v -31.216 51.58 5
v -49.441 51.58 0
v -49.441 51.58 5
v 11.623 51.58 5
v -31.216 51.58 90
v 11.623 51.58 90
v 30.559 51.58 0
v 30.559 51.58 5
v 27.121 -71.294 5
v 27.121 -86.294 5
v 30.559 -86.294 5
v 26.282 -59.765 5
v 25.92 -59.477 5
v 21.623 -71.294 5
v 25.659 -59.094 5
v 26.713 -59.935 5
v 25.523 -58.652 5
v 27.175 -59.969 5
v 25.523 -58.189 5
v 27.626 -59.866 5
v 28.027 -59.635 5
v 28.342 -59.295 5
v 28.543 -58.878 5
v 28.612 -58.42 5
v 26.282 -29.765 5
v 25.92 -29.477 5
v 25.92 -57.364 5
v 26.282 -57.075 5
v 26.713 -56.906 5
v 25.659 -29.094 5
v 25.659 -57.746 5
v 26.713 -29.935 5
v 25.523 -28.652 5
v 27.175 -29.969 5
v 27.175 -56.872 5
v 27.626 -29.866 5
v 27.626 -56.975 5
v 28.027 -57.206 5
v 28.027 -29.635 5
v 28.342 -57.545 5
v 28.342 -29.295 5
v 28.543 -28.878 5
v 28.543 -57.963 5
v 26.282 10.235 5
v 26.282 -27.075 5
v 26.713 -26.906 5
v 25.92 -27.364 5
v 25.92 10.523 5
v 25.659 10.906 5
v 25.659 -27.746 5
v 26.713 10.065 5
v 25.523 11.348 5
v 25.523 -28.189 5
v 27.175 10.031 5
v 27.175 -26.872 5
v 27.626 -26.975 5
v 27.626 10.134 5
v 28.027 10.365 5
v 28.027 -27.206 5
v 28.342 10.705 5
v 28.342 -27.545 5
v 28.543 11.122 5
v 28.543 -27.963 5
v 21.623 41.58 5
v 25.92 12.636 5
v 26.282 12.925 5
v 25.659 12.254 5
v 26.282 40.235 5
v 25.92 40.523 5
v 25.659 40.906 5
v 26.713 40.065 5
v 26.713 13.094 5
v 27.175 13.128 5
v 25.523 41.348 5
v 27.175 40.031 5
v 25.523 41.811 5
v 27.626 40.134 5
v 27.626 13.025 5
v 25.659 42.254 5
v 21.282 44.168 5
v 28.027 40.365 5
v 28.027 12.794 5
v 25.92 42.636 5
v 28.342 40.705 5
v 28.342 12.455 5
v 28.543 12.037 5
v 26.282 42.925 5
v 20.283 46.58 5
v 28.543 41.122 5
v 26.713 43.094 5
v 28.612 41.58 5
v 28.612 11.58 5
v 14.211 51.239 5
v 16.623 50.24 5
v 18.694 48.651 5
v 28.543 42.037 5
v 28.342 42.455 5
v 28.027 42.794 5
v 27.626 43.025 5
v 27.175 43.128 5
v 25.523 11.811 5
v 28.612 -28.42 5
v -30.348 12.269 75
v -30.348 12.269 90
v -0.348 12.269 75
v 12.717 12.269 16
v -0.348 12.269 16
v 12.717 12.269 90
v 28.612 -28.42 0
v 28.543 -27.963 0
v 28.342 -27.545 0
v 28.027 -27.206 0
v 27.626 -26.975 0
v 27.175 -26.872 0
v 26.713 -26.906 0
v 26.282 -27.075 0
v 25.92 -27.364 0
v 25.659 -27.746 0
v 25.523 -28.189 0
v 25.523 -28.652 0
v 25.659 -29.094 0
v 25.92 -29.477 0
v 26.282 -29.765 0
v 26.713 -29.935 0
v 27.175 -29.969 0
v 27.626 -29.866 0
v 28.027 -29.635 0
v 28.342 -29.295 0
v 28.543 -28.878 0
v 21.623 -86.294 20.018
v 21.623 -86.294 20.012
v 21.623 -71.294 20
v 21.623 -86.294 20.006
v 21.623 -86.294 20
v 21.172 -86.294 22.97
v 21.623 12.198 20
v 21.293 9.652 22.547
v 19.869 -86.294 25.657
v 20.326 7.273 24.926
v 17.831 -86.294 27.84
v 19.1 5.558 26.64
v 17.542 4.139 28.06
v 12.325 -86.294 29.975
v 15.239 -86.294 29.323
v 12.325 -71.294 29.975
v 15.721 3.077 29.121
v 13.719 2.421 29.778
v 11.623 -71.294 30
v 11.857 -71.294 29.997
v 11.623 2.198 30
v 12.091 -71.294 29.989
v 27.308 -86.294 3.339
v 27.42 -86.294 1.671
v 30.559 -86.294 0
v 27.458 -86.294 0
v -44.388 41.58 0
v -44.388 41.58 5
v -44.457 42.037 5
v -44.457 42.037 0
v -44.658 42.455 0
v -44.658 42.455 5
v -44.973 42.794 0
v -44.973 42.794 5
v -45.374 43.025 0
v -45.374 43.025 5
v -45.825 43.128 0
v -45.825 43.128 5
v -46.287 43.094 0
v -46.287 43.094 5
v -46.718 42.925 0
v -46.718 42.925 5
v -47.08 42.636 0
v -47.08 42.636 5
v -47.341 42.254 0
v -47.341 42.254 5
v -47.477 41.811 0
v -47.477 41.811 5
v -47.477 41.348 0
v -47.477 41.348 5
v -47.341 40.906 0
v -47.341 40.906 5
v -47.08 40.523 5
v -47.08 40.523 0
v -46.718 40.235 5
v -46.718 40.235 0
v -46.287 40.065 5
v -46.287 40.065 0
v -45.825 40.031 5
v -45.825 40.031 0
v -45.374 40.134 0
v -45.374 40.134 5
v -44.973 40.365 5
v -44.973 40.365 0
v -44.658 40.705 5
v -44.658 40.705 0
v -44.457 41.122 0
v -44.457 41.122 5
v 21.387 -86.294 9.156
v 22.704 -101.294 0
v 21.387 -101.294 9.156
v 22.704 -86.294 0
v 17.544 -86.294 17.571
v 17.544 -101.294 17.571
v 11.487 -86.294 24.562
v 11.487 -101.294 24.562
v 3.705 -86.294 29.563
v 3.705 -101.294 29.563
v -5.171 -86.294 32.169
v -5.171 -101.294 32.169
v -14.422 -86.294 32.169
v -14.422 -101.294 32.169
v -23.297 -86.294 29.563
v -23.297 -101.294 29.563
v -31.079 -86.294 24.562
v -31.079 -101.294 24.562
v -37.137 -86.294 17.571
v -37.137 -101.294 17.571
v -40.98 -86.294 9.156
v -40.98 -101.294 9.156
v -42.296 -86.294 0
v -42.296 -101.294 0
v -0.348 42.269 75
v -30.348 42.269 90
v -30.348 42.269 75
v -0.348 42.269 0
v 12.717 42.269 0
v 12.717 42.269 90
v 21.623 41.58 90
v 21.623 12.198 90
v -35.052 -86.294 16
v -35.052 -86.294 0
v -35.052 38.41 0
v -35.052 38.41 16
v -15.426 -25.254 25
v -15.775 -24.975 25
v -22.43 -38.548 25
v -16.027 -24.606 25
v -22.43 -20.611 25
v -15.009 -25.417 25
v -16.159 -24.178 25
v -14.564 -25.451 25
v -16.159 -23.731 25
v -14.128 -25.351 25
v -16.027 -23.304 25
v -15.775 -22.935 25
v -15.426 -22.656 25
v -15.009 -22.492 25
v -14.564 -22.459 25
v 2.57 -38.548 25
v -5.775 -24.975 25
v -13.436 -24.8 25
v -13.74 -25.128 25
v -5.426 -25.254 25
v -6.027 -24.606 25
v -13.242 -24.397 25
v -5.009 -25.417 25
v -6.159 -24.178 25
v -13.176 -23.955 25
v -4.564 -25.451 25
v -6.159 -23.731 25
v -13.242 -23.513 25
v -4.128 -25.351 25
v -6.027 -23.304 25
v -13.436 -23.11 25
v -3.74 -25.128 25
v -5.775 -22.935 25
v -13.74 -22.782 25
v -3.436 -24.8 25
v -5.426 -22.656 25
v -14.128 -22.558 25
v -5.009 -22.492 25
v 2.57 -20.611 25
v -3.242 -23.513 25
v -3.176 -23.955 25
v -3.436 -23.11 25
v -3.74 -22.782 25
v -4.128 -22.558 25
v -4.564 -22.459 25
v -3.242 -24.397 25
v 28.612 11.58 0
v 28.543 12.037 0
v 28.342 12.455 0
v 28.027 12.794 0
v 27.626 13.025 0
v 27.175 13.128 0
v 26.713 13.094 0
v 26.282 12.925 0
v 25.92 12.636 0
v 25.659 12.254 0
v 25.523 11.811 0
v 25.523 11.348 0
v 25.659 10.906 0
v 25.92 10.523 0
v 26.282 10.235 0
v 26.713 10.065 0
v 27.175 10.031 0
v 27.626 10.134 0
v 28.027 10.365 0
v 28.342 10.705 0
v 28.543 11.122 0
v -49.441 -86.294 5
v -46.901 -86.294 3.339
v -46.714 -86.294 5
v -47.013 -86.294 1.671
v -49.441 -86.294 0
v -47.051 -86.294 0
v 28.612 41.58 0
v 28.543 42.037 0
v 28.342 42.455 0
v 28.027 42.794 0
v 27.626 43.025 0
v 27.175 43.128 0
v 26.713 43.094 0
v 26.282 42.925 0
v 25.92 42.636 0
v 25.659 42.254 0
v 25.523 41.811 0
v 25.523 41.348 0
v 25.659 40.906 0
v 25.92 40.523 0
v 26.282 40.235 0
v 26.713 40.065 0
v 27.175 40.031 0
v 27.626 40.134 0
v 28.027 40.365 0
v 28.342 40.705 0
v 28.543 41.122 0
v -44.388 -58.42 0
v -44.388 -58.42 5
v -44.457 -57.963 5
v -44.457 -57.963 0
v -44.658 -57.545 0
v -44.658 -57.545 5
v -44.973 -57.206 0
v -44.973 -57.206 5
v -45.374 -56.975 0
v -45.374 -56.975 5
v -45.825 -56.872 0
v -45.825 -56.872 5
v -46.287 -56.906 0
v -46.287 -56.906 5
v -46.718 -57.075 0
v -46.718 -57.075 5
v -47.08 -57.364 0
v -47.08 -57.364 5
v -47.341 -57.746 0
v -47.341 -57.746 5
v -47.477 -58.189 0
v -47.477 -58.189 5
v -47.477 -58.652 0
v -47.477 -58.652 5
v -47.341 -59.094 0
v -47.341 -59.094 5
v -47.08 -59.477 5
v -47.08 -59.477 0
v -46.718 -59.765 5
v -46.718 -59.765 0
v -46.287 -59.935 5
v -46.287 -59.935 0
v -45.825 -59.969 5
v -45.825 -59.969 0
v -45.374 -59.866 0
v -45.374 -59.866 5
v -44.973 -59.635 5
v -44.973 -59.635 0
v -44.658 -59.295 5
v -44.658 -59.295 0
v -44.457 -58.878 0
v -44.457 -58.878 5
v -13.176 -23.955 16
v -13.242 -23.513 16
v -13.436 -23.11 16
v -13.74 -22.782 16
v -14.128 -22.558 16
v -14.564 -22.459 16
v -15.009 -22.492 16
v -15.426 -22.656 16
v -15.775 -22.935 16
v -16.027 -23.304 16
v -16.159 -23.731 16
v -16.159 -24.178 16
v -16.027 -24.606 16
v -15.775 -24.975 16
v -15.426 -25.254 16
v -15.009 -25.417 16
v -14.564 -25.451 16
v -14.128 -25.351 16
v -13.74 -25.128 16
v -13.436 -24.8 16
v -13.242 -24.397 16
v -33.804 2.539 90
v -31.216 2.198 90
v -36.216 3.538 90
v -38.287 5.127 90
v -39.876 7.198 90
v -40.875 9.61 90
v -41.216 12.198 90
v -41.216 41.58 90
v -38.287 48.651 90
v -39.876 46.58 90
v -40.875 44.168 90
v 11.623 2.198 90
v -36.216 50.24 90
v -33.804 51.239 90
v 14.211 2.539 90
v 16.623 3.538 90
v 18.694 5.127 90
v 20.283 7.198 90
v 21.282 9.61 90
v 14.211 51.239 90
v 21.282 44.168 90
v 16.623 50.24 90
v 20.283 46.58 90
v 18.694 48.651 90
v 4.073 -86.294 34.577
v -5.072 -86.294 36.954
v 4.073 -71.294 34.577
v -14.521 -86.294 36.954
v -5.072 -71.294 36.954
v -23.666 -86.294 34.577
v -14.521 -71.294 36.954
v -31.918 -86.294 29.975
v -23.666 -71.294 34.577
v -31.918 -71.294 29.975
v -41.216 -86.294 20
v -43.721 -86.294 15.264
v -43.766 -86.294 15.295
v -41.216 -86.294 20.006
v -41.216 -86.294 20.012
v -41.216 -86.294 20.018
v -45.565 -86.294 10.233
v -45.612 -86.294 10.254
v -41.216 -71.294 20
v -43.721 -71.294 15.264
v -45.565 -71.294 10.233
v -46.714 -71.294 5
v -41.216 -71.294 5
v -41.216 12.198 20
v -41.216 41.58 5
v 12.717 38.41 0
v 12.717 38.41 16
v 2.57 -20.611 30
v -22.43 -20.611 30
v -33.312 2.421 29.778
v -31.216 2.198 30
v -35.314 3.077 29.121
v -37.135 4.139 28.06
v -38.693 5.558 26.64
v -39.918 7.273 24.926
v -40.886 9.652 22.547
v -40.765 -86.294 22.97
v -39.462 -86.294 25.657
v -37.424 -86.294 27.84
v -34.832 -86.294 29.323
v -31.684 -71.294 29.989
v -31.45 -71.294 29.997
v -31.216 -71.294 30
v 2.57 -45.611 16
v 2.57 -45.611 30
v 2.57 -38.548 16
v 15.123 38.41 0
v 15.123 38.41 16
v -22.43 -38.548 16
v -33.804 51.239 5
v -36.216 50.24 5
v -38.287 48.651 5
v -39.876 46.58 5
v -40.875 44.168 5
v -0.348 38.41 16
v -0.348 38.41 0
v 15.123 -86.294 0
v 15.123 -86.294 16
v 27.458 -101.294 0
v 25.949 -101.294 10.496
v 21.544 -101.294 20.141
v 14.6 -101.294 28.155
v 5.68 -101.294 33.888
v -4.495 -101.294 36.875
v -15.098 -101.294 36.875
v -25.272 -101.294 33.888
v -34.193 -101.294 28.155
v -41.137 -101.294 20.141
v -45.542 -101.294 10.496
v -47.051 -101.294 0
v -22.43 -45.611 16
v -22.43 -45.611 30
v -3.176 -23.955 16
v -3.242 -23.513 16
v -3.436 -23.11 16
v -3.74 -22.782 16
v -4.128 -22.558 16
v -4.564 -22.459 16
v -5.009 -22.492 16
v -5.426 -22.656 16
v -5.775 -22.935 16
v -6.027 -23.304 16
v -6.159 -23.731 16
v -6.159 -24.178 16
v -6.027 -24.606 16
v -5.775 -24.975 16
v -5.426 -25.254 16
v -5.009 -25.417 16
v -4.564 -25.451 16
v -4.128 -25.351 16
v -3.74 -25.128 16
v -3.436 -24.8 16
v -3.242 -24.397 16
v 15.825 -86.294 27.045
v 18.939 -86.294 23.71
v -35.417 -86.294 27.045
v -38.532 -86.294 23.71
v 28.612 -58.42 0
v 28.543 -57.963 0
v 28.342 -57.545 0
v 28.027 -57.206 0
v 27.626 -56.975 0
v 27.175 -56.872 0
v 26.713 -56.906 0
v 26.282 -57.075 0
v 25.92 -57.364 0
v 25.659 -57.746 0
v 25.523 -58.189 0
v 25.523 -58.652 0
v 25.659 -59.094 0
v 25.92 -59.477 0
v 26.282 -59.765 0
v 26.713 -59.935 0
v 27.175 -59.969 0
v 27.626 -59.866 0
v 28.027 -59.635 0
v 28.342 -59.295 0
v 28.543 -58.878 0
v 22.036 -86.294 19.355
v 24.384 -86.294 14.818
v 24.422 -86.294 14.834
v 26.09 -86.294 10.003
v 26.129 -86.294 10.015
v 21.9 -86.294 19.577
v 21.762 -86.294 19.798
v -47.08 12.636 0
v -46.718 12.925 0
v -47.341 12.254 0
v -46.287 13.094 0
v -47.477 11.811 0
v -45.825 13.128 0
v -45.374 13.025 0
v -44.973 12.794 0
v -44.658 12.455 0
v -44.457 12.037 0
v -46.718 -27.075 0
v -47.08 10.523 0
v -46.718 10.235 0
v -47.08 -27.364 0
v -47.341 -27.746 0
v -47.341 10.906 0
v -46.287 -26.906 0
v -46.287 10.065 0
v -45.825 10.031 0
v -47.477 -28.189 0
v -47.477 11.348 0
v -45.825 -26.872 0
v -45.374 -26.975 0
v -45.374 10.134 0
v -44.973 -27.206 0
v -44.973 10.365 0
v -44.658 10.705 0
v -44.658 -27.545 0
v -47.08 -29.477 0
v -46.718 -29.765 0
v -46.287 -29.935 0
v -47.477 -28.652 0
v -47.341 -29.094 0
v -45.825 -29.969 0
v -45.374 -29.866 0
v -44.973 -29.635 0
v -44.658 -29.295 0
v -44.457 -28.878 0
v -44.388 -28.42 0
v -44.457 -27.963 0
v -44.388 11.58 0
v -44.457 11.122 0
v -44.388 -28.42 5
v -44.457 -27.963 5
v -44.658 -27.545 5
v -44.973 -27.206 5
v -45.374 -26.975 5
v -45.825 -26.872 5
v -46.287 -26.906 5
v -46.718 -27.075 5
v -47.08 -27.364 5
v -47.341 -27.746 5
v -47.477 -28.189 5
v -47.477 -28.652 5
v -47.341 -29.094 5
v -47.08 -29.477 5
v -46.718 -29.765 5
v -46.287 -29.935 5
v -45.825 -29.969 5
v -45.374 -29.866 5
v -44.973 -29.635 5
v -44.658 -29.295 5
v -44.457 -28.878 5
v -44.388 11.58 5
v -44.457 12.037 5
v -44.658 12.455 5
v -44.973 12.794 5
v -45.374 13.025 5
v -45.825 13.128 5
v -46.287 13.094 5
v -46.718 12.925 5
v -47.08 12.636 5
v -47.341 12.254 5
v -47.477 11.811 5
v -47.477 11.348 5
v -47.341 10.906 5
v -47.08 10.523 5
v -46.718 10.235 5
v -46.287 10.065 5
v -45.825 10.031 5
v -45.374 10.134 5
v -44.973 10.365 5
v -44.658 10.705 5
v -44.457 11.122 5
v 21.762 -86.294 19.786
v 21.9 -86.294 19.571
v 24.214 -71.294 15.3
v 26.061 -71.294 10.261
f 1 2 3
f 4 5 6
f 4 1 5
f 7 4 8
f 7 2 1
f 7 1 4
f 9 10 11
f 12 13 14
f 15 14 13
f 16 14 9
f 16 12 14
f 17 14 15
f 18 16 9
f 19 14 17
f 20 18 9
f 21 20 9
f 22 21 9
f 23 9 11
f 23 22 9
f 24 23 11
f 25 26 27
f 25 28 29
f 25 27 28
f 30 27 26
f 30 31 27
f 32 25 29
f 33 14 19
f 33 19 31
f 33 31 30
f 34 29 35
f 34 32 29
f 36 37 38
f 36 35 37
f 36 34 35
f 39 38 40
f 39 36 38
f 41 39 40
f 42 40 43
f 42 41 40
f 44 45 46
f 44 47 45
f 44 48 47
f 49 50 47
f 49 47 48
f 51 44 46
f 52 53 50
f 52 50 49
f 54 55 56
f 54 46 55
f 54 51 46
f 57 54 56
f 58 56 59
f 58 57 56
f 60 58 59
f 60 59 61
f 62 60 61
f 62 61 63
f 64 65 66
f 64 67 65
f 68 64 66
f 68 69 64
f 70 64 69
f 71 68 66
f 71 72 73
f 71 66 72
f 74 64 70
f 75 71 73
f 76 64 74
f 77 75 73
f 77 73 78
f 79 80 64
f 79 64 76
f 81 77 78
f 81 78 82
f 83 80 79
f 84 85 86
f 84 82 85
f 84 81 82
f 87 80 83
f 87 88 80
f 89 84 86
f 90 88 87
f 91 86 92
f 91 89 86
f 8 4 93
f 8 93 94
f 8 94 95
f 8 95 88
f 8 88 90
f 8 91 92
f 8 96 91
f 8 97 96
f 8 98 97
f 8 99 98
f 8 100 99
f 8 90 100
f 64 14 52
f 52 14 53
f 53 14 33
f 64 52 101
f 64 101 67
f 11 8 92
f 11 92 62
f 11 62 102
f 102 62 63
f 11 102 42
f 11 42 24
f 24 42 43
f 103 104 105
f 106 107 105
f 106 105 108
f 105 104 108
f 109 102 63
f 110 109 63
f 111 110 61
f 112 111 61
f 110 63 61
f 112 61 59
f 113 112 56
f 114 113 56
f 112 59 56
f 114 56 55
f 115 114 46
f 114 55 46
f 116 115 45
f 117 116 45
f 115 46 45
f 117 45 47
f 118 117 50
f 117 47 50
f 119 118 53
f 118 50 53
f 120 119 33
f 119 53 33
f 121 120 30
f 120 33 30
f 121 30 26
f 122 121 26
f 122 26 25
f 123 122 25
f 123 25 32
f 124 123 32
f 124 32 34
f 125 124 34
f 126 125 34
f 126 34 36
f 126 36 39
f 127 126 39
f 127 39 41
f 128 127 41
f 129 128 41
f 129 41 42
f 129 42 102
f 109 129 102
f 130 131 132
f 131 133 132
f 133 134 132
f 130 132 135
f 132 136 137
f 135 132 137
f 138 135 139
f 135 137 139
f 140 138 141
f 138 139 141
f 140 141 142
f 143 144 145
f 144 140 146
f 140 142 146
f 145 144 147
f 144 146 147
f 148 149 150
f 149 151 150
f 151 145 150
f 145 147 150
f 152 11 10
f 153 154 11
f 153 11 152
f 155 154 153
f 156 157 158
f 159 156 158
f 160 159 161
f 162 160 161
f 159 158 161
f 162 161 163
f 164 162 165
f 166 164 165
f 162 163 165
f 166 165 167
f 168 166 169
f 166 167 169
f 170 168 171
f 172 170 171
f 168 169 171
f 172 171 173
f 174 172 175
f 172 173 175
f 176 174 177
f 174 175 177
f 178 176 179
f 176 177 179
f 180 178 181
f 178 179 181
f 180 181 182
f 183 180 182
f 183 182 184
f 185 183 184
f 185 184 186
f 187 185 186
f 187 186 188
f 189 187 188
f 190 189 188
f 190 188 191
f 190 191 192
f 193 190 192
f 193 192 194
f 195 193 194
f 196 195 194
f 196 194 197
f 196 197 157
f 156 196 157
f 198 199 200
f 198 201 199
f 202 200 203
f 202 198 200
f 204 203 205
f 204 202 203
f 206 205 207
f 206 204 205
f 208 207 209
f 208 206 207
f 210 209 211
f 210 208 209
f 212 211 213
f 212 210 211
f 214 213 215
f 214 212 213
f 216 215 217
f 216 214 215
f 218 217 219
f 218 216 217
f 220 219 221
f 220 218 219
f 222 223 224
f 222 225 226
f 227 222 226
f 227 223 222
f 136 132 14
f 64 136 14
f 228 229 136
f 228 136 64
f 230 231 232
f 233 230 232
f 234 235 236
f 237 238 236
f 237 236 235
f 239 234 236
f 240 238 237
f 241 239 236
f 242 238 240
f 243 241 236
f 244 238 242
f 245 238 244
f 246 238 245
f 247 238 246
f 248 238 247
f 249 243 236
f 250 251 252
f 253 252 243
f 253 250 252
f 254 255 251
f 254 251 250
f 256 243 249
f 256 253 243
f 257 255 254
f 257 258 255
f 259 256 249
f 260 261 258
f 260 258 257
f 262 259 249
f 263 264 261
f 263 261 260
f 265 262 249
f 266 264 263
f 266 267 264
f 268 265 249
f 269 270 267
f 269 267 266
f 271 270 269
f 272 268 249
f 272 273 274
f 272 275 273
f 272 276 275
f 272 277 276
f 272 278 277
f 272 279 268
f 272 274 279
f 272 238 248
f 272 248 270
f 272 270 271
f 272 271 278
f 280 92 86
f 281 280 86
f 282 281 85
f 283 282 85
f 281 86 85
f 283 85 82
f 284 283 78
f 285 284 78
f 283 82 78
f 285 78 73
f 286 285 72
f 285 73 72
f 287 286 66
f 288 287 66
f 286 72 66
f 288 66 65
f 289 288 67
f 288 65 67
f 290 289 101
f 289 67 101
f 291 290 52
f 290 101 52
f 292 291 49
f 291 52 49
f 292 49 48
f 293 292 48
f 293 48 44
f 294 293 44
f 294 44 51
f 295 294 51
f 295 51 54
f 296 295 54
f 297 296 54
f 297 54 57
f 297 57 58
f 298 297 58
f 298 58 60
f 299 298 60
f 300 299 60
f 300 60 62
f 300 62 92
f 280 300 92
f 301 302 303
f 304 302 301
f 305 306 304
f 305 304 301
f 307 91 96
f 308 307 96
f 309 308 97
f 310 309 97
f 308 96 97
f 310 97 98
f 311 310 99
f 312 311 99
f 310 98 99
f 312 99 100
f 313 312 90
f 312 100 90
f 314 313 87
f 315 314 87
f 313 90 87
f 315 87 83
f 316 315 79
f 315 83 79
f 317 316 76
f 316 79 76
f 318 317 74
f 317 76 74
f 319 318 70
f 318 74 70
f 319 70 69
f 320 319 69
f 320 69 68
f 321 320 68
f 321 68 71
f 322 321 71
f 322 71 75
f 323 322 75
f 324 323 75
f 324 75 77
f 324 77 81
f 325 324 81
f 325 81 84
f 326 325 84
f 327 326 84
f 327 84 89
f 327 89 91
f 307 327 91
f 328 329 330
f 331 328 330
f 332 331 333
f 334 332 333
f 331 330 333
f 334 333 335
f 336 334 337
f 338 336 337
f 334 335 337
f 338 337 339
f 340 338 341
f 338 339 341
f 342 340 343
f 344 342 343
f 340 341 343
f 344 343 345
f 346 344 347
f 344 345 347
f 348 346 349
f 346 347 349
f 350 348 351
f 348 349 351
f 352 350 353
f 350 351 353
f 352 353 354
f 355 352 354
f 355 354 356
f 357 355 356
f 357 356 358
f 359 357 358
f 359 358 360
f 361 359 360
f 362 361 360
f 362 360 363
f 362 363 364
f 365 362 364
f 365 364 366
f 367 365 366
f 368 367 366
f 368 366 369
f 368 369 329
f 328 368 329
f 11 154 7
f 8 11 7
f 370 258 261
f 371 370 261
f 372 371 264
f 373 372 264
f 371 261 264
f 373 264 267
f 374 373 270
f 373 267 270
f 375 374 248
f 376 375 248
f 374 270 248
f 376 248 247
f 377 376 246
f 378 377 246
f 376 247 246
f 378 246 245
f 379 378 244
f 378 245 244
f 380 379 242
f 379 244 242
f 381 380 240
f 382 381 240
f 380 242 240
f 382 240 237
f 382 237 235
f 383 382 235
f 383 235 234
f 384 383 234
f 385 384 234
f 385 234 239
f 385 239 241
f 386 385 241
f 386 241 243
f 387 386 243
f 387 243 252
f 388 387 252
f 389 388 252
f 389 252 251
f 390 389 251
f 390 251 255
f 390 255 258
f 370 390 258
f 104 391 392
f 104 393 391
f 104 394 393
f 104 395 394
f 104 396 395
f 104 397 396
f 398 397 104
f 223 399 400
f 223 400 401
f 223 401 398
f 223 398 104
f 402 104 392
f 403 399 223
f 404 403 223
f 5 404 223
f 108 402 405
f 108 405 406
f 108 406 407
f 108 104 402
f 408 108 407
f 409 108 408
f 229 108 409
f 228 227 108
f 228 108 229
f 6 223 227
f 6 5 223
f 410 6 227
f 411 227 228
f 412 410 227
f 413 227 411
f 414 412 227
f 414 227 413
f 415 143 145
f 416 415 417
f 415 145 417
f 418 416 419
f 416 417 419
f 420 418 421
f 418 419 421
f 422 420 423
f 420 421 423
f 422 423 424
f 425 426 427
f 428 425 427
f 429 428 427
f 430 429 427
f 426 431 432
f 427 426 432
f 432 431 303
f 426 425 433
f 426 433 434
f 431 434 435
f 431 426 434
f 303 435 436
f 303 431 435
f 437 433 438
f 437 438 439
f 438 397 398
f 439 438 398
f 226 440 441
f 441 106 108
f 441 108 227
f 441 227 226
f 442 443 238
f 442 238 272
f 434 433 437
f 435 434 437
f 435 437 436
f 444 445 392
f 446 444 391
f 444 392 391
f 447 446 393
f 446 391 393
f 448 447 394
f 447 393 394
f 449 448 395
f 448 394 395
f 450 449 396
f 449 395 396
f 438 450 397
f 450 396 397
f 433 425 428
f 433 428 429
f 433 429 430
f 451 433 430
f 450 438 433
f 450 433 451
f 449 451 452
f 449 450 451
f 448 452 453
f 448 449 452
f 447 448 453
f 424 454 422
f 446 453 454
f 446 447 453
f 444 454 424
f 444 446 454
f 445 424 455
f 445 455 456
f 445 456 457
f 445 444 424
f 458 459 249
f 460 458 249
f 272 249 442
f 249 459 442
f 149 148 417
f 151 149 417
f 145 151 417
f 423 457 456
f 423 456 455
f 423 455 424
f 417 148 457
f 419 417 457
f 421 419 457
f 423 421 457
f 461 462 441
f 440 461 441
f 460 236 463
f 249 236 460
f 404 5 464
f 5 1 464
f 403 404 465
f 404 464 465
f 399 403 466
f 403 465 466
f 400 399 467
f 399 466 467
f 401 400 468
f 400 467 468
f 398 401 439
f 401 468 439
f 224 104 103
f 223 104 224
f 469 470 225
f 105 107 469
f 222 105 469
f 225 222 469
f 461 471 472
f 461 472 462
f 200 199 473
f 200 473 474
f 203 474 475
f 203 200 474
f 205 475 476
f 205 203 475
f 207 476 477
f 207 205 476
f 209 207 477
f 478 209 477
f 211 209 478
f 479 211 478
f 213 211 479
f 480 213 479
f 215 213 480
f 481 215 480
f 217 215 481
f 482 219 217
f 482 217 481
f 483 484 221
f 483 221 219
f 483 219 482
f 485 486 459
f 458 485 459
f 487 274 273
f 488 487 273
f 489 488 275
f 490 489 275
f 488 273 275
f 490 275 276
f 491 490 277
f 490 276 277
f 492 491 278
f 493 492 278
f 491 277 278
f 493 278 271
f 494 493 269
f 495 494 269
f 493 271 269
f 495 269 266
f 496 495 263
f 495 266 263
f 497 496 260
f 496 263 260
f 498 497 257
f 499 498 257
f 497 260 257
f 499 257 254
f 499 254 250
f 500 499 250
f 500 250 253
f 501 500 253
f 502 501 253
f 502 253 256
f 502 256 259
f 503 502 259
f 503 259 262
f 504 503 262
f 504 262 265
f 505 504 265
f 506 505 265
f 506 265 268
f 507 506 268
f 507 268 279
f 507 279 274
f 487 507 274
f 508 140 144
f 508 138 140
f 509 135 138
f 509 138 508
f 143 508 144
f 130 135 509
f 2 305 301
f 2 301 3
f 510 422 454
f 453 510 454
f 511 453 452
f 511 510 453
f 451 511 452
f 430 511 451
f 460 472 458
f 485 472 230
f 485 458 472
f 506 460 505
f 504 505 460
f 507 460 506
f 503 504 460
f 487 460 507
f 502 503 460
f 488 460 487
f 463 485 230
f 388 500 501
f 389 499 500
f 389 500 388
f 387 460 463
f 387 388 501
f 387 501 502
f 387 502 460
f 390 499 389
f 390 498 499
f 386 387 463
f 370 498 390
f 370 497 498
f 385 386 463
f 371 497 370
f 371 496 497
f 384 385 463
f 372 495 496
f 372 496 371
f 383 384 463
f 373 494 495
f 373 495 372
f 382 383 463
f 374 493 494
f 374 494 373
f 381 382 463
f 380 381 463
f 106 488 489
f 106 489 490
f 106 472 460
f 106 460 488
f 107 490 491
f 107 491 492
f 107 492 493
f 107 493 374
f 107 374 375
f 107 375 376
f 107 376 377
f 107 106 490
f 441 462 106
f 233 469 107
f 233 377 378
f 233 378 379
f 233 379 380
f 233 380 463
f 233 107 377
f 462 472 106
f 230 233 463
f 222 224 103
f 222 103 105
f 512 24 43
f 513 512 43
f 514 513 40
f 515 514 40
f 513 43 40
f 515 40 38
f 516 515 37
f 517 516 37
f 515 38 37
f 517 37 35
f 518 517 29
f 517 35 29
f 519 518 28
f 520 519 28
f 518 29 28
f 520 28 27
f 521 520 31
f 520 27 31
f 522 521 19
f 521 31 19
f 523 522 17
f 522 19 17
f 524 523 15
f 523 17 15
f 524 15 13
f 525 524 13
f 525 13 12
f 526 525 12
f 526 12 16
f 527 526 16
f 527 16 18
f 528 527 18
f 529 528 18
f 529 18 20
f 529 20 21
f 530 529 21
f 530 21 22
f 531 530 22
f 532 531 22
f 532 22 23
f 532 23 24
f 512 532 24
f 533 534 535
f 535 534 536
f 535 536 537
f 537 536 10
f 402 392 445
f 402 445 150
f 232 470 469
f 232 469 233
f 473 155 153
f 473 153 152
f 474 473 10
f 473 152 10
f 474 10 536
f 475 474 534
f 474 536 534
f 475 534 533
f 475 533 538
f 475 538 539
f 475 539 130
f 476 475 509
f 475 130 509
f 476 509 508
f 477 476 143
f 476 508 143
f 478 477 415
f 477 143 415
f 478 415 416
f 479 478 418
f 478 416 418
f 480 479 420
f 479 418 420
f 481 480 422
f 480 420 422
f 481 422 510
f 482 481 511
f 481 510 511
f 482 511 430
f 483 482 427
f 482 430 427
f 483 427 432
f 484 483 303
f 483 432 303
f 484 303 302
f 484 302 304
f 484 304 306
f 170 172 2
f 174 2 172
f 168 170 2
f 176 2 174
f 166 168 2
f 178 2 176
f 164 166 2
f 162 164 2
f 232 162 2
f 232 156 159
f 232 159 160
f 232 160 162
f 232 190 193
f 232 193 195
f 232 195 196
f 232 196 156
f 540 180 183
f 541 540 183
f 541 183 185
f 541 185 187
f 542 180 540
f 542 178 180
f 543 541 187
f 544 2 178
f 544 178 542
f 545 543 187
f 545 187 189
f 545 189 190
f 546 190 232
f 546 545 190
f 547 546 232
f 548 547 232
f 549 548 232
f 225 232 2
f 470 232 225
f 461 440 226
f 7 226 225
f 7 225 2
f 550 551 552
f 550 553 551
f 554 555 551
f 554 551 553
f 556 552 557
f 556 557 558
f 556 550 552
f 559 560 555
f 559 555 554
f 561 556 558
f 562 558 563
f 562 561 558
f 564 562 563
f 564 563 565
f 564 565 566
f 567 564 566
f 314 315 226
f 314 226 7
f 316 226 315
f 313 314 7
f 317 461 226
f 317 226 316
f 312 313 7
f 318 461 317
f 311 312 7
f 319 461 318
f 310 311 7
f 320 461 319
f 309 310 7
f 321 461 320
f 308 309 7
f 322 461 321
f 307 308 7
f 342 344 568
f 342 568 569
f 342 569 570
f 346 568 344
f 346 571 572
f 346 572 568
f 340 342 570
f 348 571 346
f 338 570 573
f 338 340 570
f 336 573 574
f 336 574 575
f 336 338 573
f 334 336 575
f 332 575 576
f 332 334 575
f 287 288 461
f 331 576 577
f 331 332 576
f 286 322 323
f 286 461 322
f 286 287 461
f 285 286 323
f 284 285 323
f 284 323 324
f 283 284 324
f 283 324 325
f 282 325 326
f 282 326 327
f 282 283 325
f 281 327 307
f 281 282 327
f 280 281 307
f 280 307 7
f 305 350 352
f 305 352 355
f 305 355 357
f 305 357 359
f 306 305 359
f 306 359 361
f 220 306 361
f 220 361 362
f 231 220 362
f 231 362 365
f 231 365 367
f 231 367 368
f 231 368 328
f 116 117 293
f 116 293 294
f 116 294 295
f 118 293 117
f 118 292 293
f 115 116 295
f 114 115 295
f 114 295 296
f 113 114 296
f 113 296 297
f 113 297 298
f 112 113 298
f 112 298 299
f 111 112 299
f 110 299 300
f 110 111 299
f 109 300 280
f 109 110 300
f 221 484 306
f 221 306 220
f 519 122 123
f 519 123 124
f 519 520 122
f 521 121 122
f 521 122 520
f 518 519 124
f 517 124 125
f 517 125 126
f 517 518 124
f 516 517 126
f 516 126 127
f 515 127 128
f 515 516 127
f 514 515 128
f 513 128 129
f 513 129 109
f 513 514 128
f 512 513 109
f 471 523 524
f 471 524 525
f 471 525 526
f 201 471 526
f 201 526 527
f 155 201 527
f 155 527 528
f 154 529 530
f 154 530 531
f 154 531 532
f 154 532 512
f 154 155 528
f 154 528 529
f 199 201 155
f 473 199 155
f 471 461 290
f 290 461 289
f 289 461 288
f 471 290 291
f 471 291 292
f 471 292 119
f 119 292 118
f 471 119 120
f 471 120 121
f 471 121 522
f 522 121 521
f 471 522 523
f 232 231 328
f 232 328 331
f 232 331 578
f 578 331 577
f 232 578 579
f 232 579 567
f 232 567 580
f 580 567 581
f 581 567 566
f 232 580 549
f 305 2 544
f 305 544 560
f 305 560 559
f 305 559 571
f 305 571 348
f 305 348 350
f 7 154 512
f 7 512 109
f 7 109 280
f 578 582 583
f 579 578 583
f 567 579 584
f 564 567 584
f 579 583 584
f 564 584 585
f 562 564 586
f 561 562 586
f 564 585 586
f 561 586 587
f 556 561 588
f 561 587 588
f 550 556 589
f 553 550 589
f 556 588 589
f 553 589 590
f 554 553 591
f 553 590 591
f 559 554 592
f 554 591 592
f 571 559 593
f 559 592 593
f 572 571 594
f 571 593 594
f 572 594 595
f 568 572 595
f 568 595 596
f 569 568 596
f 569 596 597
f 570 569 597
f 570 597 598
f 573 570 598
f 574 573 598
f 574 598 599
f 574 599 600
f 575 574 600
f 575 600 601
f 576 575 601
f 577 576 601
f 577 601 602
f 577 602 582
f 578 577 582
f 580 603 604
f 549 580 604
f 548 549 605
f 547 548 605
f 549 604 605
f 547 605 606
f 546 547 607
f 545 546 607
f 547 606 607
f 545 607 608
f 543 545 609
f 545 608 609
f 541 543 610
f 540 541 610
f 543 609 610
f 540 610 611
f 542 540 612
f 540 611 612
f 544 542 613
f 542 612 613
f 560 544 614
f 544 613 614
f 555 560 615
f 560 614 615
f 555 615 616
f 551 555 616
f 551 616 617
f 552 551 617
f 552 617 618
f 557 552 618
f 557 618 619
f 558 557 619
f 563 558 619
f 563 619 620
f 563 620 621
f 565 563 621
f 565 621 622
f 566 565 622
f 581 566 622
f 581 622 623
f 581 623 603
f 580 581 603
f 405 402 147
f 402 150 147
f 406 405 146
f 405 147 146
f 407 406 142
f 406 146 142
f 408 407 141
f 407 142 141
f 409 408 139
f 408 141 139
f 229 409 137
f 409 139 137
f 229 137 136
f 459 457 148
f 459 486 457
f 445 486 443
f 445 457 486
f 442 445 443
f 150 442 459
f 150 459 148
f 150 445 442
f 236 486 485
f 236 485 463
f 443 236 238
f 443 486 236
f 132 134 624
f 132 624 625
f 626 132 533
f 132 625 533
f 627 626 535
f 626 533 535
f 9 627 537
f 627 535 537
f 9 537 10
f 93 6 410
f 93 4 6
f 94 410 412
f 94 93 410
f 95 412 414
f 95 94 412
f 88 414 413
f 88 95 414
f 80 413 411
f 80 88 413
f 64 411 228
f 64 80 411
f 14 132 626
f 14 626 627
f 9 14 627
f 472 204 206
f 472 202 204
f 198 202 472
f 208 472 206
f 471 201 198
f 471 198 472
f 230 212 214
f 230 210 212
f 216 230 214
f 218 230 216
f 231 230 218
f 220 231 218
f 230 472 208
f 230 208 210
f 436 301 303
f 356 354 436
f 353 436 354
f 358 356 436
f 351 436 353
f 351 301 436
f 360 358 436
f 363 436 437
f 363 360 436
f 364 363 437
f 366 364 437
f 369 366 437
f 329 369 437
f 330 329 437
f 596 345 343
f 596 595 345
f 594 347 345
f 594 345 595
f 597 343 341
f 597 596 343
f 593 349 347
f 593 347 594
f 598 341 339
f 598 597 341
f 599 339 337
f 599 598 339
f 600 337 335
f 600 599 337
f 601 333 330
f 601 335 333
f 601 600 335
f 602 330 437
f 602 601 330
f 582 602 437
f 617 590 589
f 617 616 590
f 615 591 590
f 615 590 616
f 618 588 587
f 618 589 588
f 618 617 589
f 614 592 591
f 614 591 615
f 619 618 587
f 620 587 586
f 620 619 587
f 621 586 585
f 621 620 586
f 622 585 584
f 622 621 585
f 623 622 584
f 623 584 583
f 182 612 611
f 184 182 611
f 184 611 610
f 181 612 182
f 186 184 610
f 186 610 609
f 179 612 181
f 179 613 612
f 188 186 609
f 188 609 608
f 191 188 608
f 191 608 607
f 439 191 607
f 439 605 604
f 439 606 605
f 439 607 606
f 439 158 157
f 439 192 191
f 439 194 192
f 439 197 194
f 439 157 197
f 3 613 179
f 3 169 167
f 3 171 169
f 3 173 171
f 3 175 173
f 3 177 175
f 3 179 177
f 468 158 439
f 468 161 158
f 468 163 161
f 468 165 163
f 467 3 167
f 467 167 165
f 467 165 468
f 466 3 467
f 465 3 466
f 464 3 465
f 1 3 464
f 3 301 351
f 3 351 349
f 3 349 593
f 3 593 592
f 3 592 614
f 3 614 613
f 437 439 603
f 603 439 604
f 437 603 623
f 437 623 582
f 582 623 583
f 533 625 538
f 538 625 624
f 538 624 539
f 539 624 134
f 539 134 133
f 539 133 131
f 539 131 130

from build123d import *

# Parameters (mm, degrees)
SKETCH_1_W           = 80
SKETCH_1_H           = 156.363783163
EXTRUDE_1_DEPTH      = 90
SKETCH_3_W           = 30
SKETCH_3_H           = 30
CUT_EXTRUDE_1_DEPTH  = 15
SKETCH_4_W           = 182.158516052
SKETCH_4_H           = 121.356957168
CUT_EXTRUDE_2_DEPTH  = 60
SKETCH_6_W           = 50.175493085
SKETCH_6_H           = 149.046749465
CUT_EXTRUDE_4_DEPTH  = 16
SKETCH_7_W           = 13.065428471
SKETCH_7_H           = 30
CUT_EXTRUDE_5_DEPTH  = 147.711160425
SKETCH_8_W           = 28.25361391
SKETCH_8_H           = 169.077909422
CUT_EXTRUDE_6_DEPTH  = 85
SKETCH_10_W          = 25
SKETCH_10_H          = 25
CUT_EXTRUDE_7_DEPTH  = 5
SKETCH_11_W          = 25
SKETCH_11_H          = 7.062774738
CUT_EXTRUDE_8_DEPTH  = 133.850158424
SKETCH_12_R          = 1.553167794
CUT_EXTRUDE_9_DEPTH  = 144.698171851
FILLET_3_R           = 10
CUT_EXTRUDE_START    = 60
SKETCH_15_W          = 25.147195628
SKETCH_15_H          = 171.888478346
CUT_EXTRUDE_10_DEPTH = 85
FILLET_6_R           = 10
FILLET_7_R           = 10
SKETCH_18_W          = 152.348651532
SKETCH_18_H          = 32.578688912
CUT_EXTRUDE_11_DEPTH = 147.711160425
SKETCH_19_R          = 37.254412131
SKETCH_19_R_2        = 32.5
EXTRUDE_3_DEPTH      = 15
SKETCH_20_W          = 127.729938291
SKETCH_20_H          = 42.54840274
CUT_EXTRUDE_12_DEPTH = 185.159311294
EXTRUDE_5_DEPTH      = 15
EXTRUDE_START        = 15
EXTRUDE_6_DEPTH      = 15
EXTRUDE_7_DEPTH      = 15
SKETCH_27_R          = 1.5
CUT_EXTRUDE_13_DEPTH = 10


with BuildPart() as part:
    # 草图1 → 凸台-拉伸1 (new body)
    with BuildSketch(Plane.XY):
        with Locations((-9.441340782, -26.602259963)):
            Rectangle(SKETCH_1_W, SKETCH_1_H)
    extrude(amount=EXTRUDE_1_DEPTH)

    # 草图3 → 切除-拉伸1 (cut)
    with BuildSketch(Plane.XY.offset(90)):
        with Locations((-15.348450006, 27.268684522)):
            Rectangle(SKETCH_3_W, SKETCH_3_H)
    extrude(amount=-CUT_EXTRUDE_1_DEPTH, mode=Mode.SUBTRACT)

    # 草图4 → 切除-拉伸2 (cut)
    with BuildSketch(Plane.XY.offset(90)):
        with Locations((0, -58.480028538)):
            Rectangle(SKETCH_4_W, SKETCH_4_H)
    extrude(amount=-CUT_EXTRUDE_2_DEPTH, mode=Mode.SUBTRACT)

    # 草图6 → 切除-拉伸4 (cut)
    with BuildSketch(Plane(origin=(0, 0, 0), x_dir=(-1, 0, 0), z_dir=(0, 0, -1))):
        with Locations((9.964306437, -36.113761051)):
            Rectangle(SKETCH_6_W, SKETCH_6_H)
    extrude(amount=-CUT_EXTRUDE_4_DEPTH, mode=Mode.SUBTRACT)

    # 草图7 → 切除-拉伸5 (cut, through all)
    with BuildSketch(Plane.XY.offset(90)):
        with Locations((6.18426423, 27.268684522)):
            Rectangle(SKETCH_7_W, SKETCH_7_H)
    extrude(amount=-CUT_EXTRUDE_5_DEPTH, mode=Mode.SUBTRACT)

    # 草图8 → 切除-拉伸6 (cut)
    with BuildSketch(Plane.XY.offset(90)):
        with Locations((-55.342514846, -28.081506765)):
            Rectangle(SKETCH_8_W, SKETCH_8_H)
    extrude(amount=-CUT_EXTRUDE_6_DEPTH, mode=Mode.SUBTRACT)

    # 草图10 → 切除-拉伸7 (cut)
    with BuildSketch(Plane.XY.offset(30)):
        with Locations((-9.930002564, -33.110581364)):
            Rectangle(SKETCH_10_W, SKETCH_10_H)
    extrude(amount=-CUT_EXTRUDE_7_DEPTH, mode=Mode.SUBTRACT)

    # 草图11 → 切除-拉伸8 (cut, through all)
    with BuildSketch(Plane.XY.offset(25)):
        with Locations((-9.930002564, -42.079193995)):
            Rectangle(SKETCH_11_W, SKETCH_11_H)
    extrude(amount=-CUT_EXTRUDE_8_DEPTH, mode=Mode.SUBTRACT)

    # 草图12 → 切除-拉伸9 (cut, through all)
    with BuildSketch(Plane.XY.offset(5)):
        with Locations((-45.941340782, 41.579631618)):
            Circle(SKETCH_12_R)
        with Locations((27.058659218, 41.579631618)):
            Circle(SKETCH_12_R)
        with Locations((-45.941340782, 11.579631618)):
            Circle(SKETCH_12_R)
        with Locations((-45.941340782, -28.420368382)):
            Circle(SKETCH_12_R)
        with Locations((27.058659218, 11.579631618)):
            Circle(SKETCH_12_R)
        with Locations((27.058659218, -28.420368382)):
            Circle(SKETCH_12_R)
        with Locations((-45.941340782, -58.420368382)):
            Circle(SKETCH_12_R)
        with Locations((27.058659218, -58.420368382)):
            Circle(SKETCH_12_R)
    extrude(amount=-CUT_EXTRUDE_9_DEPTH, mode=Mode.SUBTRACT)

    # 圆角3
    fillet_3_edges = [part.edges().sort_by_distance(p)[0] for p in [
        (-41.215707891, -51.292850749, 30),
    ]]
    fillet(fillet_3_edges, radius=FILLET_3_R)

    # 草图15 → 切除-拉伸10 (cut)
    with BuildSketch(Plane.XY.offset(30).offset(CUT_EXTRUDE_START)):
        with Locations((34.196439865, -22.534331259)):
            Rectangle(SKETCH_15_W, SKETCH_15_H)
    extrude(amount=-CUT_EXTRUDE_10_DEPTH, mode=Mode.SUBTRACT)

    # 圆角6
    fillet_6_edges = [part.edges().sort_by_distance(p)[0] for p in [
        (21.622842051, -51.292850749, 30),
    ]]
    fillet(fillet_6_edges, radius=FILLET_6_R)

    # 圆角7
    fillet_7_edges = [part.edges().sort_by_distance(p)[0] for p in [
        (21.622842051, 2.198450046, 55),
        (-41.215707891, 2.198450046, 55),
        (-41.215707891, 51.579631618, 47.5),
        (21.622842051, 51.579631618, 47.5),
    ]]
    fillet(fillet_7_edges, radius=FILLET_7_R)

    # 草图18 → 切除-拉伸11 (cut, through all)
    with BuildSketch(Plane(origin=(0, 0, 0), x_dir=(-1, 0, 0), z_dir=(0, 0, -1))):
        with Locations((19.986133812, -102.5828817)):
            Rectangle(SKETCH_18_W, SKETCH_18_H)
    extrude(amount=-CUT_EXTRUDE_11_DEPTH, mode=Mode.SUBTRACT)

    # 草图19 → 凸台-拉伸3 (add)
    with BuildSketch(Plane.XZ.offset(86.293537244)):
        with Locations(Location((-9.79643292, 0, 0), (0, 0, 126.427336474))):
            Circle(SKETCH_19_R)
        with Locations(Location((-9.79643292, 0, 0), (0, 0, 112.619864948))):
            Circle(SKETCH_19_R_2, mode=Mode.SUBTRACT)
    extrude(amount=EXTRUDE_3_DEPTH)

    # 草图20 → 切除-拉伸12 (cut, through all)
    with BuildSketch(Plane.XZ.offset(101.293537244)):
        with Locations((-5.047238287, -21.27420137)):
            Rectangle(SKETCH_20_W, SKETCH_20_H)
    extrude(amount=-CUT_EXTRUDE_12_DEPTH, mode=Mode.SUBTRACT)

    # 草图24 → 凸台-拉伸5 (add)
    with BuildSketch(Plane(origin=(0, -86.293537244, 0), x_dir=(1, 0, 0), z_dir=(0, 1, 0))):
        with BuildLine():
            Line((-46.713789586, -5), (-41.215707891, -5))
            Line((-41.215707891, -5), (-41.215707891, -20))
            ThreePointArc((-41.215707891, -20), (-44.727814177, -12.779693075), (-46.713789586, -5))
        make_face()
    extrude(amount=EXTRUDE_5_DEPTH)

    # 草图25 → 凸台-拉伸6 (add)
    with BuildSketch(Plane(origin=(0, -86.293537244, 0), x_dir=(1, 0, 0), z_dir=(0, 1, 0)).offset(EXTRUDE_START)):
        with BuildLine():
            Line((-31.918208762, -29.975294107), (12.325342922, -29.975294107))
            ThreePointArc((12.325342922, -29.975294107), (-9.79643292, -37.254412131), (-31.918208762, -29.975294107))
        make_face()
    extrude(amount=-EXTRUDE_6_DEPTH)

    # 草图26 → 凸台-拉伸7 (add)
    with BuildSketch(Plane(origin=(0, -86.293537244, 0), x_dir=(1, 0, 0), z_dir=(0, 1, 0))):
        with BuildLine():
            Line((27.120923747, -5), (21.622842051, -5))
            Line((21.622842051, -5), (21.622842051, -20))
            ThreePointArc((21.622842051, -20), (25.233426536, -12.815789153), (27.120923747, -5))
        make_face()
    extrude(amount=EXTRUDE_7_DEPTH)

    # 草图27 → 切除-拉伸13 (cut)
    with BuildSketch(Plane.XY.offset(25)):
        with Locations((-4.675690362, -23.954796266)):
            Circle(SKETCH_27_R)
        with Locations((-14.675690362, -23.954796266)):
            Circle(SKETCH_27_R)
    extrude(amount=-CUT_EXTRUDE_13_DEPTH, mode=Mode.SUBTRACT)


solid = part.part
